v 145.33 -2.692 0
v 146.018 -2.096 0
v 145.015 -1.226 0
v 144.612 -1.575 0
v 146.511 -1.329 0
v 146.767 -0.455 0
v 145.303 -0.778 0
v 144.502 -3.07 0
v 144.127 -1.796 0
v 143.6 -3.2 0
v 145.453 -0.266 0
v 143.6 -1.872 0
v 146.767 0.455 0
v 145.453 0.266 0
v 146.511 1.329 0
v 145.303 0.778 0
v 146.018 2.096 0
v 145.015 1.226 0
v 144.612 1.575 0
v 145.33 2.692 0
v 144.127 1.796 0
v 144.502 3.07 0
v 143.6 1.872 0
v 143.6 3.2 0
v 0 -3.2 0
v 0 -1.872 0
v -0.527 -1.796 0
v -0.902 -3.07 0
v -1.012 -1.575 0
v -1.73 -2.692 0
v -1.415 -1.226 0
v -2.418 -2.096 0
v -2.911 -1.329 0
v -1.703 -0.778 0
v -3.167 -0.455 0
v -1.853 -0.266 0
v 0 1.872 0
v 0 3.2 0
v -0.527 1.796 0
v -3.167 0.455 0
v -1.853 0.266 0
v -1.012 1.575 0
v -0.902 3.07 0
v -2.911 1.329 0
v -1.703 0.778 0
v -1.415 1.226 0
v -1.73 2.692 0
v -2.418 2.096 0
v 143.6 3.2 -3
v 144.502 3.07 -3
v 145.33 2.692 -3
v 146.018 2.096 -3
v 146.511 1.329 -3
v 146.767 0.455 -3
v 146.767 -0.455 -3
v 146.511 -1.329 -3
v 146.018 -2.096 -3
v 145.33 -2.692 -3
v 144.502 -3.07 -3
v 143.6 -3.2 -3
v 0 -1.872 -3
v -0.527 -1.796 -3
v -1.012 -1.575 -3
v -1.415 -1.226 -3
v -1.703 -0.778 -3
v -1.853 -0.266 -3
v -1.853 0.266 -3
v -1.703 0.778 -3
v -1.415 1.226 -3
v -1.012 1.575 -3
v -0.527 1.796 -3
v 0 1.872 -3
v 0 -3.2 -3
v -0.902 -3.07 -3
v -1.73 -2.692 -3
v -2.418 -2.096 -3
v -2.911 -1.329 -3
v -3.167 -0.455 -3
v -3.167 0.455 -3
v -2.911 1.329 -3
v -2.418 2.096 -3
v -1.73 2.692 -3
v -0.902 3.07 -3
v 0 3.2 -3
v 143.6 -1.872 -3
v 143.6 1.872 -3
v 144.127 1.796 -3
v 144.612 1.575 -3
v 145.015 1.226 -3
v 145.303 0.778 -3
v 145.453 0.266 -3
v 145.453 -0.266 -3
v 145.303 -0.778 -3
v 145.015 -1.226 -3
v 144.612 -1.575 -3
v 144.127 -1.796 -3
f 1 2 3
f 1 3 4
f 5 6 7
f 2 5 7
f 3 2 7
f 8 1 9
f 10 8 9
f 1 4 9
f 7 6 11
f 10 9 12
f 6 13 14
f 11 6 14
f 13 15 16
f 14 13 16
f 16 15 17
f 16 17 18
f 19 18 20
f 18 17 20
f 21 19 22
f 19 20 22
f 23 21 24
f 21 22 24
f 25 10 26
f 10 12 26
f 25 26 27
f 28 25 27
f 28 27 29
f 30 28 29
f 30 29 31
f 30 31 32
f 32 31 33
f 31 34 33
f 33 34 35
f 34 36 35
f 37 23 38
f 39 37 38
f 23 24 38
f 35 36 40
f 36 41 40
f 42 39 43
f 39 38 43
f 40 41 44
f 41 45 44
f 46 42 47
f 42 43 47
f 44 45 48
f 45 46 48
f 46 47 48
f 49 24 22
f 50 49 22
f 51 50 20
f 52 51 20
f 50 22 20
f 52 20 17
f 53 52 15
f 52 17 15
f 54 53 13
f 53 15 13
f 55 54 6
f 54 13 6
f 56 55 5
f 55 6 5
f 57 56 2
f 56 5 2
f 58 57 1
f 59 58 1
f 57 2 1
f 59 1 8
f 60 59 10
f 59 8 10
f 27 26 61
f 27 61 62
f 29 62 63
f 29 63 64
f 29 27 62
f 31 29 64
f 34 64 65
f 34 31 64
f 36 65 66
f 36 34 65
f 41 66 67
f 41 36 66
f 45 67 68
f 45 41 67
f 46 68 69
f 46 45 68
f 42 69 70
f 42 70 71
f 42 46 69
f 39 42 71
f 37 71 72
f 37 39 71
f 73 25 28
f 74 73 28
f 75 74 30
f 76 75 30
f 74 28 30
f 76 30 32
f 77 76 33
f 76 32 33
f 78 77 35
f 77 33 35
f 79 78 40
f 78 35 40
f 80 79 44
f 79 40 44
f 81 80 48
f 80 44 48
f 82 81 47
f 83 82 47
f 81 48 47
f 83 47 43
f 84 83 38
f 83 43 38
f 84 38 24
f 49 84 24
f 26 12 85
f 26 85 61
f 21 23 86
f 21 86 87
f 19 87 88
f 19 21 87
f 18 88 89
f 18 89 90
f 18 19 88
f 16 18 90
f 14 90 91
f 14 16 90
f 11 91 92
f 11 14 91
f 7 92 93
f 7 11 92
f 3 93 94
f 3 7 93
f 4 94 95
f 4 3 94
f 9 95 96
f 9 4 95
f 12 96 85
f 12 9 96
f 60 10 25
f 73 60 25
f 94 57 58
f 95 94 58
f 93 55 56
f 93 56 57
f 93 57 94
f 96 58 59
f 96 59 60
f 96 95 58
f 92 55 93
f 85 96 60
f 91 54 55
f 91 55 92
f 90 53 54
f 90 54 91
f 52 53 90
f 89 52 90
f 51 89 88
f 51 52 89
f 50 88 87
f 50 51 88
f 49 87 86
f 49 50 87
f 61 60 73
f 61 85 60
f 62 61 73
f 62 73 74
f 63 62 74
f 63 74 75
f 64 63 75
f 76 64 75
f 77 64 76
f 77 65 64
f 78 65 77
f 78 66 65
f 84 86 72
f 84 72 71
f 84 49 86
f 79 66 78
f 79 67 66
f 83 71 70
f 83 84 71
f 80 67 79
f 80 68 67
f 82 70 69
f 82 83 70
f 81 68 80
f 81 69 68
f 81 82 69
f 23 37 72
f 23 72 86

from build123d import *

# Parameters (mm, degrees)
BOSS_EXTRUDE1_DEPTH = 3


with BuildPart() as part:
    # Sketch2 → Boss-Extrude1 (new body)
    with BuildSketch(Plane.XY):
        with BuildLine():
            Line((0, 3.2), (143.6, 3.2))
            ThreePointArc((143.6, 3.2), (146.8, 0), (143.6, -3.2))
            Line((143.6, -3.2), (0, -3.2))
            ThreePointArc((0, -3.2), (-3.2, 0), (0, 3.2))
        make_face()
        with BuildLine():
            Line((0, 1.872), (143.6, 1.872))
            ThreePointArc((143.6, 1.872), (145.472, 0), (143.6, -1.872))
            Line((143.6, -1.872), (0, -1.872))
            ThreePointArc((0, -1.872), (-1.872, 0), (0, 1.872))
        make_face(mode=Mode.SUBTRACT)
    extrude(amount=-BOSS_EXTRUDE1_DEPTH)


solid = part.part
